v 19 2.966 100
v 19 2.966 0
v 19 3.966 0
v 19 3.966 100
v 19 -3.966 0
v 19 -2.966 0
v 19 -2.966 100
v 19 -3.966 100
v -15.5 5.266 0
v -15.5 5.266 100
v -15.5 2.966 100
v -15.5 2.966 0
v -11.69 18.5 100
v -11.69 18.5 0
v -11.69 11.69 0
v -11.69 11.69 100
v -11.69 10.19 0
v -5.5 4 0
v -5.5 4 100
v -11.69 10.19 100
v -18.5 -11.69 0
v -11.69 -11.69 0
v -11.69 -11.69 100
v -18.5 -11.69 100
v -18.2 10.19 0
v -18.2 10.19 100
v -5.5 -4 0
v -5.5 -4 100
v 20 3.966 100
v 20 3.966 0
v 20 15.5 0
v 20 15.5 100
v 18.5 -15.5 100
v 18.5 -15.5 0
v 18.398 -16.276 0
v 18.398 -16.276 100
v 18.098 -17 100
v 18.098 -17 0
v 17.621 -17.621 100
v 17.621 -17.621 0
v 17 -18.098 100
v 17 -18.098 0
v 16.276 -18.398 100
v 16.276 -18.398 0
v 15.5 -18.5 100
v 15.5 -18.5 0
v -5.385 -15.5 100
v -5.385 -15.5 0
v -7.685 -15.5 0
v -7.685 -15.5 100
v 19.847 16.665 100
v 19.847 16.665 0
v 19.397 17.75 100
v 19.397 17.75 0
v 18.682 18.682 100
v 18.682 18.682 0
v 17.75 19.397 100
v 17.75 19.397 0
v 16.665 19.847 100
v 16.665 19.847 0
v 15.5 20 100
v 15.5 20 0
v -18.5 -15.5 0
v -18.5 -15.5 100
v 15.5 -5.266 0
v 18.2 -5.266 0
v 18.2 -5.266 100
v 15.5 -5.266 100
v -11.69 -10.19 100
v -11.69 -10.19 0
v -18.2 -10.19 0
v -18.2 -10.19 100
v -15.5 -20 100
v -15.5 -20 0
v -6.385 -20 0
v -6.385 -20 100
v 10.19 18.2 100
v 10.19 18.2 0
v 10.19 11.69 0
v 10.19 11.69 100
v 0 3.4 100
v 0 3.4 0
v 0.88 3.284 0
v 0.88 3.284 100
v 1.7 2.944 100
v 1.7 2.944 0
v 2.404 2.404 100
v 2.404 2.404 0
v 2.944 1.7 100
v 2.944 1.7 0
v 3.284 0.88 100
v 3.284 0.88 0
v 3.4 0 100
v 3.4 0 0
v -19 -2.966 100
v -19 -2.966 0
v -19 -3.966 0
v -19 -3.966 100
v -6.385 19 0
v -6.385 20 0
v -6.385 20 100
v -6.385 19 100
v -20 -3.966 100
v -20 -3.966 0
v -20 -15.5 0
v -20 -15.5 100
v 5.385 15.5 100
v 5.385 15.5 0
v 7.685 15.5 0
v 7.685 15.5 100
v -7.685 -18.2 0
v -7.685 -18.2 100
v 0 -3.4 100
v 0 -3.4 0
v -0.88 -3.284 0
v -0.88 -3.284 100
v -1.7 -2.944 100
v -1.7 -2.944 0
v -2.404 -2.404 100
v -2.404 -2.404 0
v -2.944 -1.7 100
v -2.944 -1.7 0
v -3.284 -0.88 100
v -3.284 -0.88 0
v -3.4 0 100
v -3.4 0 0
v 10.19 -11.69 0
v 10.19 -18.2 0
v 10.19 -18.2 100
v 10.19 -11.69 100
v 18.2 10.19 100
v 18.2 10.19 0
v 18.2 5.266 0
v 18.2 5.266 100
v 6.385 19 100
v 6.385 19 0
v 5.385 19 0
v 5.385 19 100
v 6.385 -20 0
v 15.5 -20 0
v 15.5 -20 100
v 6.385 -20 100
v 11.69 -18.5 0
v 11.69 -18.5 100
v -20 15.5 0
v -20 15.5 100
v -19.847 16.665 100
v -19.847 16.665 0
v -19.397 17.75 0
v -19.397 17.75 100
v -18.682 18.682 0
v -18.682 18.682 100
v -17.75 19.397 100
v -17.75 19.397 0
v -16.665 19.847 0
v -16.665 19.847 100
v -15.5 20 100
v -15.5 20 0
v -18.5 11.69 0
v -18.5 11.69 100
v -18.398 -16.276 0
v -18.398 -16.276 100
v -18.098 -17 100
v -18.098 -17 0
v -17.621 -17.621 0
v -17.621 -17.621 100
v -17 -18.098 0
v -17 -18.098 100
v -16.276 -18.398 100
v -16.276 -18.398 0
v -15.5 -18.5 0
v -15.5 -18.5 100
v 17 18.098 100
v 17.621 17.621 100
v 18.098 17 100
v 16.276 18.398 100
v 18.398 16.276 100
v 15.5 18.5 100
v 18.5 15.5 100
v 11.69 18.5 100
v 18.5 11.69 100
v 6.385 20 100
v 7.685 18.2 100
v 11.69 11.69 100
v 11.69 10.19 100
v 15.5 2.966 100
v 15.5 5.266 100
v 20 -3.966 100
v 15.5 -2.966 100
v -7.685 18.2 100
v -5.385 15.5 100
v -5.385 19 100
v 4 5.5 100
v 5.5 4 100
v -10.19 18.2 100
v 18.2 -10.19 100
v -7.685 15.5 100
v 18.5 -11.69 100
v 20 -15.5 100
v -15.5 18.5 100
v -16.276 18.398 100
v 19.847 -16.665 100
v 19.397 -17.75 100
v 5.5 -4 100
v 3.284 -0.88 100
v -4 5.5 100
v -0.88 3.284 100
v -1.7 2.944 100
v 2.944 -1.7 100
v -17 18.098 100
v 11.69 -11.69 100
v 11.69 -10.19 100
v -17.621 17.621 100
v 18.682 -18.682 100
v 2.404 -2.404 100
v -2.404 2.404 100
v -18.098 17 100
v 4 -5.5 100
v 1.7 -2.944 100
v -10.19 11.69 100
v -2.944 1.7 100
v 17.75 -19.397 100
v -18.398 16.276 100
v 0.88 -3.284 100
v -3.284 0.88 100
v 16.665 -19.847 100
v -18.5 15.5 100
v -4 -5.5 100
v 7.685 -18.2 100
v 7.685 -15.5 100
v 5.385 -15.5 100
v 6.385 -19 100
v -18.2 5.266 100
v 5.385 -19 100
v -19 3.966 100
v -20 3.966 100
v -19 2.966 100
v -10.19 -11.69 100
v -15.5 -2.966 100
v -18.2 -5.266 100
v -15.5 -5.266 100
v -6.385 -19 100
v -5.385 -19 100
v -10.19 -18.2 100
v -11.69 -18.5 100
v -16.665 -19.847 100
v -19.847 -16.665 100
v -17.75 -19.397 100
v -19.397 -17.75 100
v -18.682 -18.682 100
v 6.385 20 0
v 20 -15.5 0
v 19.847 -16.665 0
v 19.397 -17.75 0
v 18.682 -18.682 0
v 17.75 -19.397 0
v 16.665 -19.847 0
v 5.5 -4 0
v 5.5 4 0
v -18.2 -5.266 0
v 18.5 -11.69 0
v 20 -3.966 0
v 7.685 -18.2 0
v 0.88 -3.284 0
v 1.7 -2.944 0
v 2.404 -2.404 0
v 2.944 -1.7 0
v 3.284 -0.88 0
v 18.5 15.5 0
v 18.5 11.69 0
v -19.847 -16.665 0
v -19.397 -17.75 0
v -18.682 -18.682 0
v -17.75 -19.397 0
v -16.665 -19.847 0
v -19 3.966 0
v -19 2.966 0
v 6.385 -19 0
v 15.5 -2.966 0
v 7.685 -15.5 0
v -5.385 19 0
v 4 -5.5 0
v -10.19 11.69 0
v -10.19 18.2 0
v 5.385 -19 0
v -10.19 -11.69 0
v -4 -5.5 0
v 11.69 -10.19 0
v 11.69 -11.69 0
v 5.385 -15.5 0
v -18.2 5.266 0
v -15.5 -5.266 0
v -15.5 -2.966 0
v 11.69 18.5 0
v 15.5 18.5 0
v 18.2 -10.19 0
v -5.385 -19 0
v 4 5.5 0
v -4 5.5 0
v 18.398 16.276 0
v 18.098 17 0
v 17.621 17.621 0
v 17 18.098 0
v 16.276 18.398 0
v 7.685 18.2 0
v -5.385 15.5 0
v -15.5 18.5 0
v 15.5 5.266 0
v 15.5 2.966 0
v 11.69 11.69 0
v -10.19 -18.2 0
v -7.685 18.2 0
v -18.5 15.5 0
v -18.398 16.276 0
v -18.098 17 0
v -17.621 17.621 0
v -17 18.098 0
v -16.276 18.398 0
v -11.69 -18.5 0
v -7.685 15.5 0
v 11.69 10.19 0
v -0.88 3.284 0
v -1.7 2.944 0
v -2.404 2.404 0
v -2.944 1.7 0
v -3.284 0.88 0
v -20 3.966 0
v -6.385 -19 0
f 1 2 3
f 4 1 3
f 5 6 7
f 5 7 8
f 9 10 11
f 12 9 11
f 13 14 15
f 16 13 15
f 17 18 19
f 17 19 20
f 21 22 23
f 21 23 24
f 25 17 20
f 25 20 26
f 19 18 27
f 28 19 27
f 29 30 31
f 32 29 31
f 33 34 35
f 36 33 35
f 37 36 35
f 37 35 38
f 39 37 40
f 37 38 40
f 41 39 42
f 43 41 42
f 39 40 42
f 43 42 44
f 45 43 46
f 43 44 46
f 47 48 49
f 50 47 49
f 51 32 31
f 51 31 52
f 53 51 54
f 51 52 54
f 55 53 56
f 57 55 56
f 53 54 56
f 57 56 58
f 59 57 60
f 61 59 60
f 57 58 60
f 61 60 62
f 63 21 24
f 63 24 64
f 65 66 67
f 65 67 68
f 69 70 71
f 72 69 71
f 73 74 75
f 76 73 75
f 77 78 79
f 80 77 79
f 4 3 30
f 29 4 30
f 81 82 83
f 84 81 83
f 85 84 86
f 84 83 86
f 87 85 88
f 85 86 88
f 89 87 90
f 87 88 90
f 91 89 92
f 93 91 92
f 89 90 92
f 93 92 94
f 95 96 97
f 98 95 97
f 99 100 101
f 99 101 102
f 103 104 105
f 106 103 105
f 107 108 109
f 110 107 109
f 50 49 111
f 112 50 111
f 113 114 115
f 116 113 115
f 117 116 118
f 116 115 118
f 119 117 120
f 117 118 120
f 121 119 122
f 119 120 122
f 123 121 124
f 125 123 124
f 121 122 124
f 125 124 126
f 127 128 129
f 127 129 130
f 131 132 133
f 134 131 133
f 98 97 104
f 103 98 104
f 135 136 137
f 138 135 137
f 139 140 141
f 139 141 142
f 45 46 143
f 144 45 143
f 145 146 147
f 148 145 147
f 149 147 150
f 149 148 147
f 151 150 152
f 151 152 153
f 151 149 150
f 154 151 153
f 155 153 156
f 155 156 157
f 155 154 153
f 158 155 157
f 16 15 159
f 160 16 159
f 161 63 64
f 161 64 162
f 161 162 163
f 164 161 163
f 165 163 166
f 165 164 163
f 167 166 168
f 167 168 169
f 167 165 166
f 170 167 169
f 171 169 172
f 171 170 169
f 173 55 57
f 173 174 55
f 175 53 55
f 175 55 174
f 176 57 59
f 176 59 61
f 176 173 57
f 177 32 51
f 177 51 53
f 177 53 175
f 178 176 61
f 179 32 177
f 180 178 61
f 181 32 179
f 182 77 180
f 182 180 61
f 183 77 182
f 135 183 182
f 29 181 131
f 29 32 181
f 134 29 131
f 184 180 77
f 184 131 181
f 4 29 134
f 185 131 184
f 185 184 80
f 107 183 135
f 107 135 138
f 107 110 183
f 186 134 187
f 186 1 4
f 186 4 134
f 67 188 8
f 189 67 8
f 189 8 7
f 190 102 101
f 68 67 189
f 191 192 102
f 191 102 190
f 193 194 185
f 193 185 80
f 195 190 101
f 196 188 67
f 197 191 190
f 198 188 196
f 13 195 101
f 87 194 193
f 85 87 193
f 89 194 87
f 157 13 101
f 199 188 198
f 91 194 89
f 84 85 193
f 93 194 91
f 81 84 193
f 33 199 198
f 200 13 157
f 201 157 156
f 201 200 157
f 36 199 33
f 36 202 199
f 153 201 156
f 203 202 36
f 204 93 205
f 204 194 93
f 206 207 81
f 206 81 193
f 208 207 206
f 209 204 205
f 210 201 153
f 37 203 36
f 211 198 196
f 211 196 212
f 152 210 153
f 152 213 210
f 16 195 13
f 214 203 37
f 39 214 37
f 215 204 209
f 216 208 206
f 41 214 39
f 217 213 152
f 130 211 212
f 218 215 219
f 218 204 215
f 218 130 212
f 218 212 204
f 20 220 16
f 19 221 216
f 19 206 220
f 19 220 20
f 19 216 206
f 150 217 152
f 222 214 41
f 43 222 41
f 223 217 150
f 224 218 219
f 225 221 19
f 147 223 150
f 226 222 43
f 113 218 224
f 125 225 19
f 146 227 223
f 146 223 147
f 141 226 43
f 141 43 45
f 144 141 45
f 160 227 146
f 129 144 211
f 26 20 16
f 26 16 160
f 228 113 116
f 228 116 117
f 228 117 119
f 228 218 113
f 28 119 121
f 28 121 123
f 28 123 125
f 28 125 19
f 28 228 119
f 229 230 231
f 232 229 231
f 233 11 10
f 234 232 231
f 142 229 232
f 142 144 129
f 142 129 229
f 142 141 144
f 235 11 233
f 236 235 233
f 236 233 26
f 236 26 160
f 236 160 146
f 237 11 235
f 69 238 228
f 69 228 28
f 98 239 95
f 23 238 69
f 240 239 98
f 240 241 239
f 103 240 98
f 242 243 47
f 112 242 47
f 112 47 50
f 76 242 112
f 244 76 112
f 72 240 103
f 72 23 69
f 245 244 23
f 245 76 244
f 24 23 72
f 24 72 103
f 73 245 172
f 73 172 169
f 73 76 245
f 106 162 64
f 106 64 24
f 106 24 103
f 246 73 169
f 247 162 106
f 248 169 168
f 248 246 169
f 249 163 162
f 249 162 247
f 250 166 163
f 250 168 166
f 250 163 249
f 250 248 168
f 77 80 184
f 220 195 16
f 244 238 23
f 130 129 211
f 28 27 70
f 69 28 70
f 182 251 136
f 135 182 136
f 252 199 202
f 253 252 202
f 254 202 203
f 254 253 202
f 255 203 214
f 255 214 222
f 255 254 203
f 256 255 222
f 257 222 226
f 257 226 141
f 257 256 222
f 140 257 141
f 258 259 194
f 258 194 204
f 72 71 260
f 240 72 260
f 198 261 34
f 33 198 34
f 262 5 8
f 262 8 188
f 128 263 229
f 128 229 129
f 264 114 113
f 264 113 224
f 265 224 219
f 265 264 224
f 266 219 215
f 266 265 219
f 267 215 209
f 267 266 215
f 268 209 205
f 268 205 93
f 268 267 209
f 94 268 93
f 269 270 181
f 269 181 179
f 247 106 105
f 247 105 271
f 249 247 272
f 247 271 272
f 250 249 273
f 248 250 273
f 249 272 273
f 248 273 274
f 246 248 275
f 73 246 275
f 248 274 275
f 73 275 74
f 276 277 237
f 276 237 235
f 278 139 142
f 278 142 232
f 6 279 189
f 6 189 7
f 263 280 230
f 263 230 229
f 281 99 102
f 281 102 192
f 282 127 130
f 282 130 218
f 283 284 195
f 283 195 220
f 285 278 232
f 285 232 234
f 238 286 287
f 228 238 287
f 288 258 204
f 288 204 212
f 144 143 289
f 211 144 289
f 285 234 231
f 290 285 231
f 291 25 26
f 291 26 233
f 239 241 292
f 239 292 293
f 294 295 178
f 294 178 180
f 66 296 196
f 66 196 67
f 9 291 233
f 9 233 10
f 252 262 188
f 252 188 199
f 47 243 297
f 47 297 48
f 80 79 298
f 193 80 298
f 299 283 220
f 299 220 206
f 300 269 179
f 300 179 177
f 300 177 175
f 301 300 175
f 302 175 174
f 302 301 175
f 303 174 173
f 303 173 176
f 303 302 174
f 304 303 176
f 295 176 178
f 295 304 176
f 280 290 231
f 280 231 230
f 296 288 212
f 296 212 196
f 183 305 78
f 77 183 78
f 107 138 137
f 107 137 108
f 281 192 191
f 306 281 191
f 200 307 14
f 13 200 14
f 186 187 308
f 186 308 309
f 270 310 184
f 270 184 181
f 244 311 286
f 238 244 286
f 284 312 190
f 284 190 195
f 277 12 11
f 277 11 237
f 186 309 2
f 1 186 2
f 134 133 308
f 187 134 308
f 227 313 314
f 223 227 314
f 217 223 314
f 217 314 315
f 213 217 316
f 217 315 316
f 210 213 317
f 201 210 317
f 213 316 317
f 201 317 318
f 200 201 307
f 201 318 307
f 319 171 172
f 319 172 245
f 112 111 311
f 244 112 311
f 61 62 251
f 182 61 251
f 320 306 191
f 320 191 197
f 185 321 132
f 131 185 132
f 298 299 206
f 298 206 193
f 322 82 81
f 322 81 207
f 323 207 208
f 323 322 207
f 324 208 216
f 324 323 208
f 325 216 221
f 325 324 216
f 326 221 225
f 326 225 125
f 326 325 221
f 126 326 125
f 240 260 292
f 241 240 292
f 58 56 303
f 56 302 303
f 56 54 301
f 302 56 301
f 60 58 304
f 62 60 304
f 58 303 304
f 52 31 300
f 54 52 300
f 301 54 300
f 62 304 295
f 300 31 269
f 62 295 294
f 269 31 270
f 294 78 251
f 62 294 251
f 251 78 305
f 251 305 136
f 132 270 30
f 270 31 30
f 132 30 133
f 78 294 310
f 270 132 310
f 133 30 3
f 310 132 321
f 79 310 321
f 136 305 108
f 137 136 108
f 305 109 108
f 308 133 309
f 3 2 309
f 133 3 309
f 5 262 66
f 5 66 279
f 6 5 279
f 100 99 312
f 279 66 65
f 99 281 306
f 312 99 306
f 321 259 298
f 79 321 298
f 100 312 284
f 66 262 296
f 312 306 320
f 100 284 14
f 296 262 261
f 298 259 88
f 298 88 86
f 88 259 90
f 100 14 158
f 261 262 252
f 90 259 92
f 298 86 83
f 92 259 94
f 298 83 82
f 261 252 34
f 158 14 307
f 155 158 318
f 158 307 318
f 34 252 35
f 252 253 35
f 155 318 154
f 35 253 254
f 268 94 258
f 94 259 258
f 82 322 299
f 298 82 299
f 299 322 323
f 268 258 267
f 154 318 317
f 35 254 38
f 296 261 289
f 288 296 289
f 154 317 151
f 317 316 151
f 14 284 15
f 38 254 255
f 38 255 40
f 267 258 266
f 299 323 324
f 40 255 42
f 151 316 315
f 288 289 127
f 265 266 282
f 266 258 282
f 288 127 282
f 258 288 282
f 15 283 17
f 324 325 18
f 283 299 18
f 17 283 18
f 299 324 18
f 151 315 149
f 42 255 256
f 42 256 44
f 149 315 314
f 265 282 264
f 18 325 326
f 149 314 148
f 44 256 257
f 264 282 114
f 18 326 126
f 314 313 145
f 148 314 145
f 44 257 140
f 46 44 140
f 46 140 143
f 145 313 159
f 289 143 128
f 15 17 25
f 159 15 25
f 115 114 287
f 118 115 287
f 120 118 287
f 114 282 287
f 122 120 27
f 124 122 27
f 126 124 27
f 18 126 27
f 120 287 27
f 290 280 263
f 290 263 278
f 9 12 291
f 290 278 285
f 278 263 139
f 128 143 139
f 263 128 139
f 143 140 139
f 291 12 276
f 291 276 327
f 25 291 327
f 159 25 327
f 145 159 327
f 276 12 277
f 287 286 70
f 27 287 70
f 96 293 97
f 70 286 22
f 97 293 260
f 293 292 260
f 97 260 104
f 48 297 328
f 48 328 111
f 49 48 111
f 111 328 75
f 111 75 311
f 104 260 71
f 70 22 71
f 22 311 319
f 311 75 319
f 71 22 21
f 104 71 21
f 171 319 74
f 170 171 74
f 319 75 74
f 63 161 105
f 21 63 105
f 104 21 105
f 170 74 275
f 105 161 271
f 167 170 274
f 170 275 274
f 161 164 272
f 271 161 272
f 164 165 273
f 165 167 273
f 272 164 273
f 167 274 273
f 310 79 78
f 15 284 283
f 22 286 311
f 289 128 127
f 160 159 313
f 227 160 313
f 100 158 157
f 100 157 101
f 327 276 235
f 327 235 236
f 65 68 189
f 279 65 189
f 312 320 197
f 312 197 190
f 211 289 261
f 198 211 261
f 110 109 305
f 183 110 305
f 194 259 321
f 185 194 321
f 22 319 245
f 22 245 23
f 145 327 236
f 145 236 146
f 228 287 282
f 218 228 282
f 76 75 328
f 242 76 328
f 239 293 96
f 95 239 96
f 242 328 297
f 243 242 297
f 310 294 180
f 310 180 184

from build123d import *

# Parameters (mm, degrees)
BOSS_EXTRUDE1_DEPTH  = 100
MIRROR3_COPY_1_DEPTH = 100
MIRROR3_COPY_2_DEPTH = 100


with BuildPart() as part:
    # Sketch1 → Boss-Extrude1 (new body)
    with BuildSketch(Plane.XY):
        with BuildLine():
            Line((3.4, 0), (5.5, 0))
            Line((5.5, 0), (5.5, 4))
            Line((5.5, 4), (11.69, 10.19))
            Line((11.69, 10.19), (18.2, 10.19))
            Line((18.2, 10.19), (18.2, 5.265595036))
            Line((18.2, 5.265595036), (15.5, 5.265595036))
            Line((15.5, 5.265595036), (15.5, 2.965595036))
            Line((15.5, 2.965595036), (19, 2.965595036))
            Line((19, 2.965595036), (19, 3.965595036))
            Line((19, 3.965595036), (20, 3.965595036))
            Line((20, 3.965595036), (20, 15.5))
            ThreePointArc((20, 15.5), (18.681980515, 18.681980515), (15.5, 20))
            Line((15.5, 20), (6.385304712, 20))
            Line((6.385304712, 20), (6.385304712, 19))
            Line((6.385304712, 19), (5.385304712, 19))
            Line((5.385304712, 19), (5.385304712, 15.5))
            Line((5.385304712, 15.5), (7.685304712, 15.5))
            Line((7.685304712, 15.5), (7.685304712, 18.2))
            Line((7.685304712, 18.2), (10.19, 18.2))
            Line((10.19, 18.2), (10.19, 11.69))
            Line((10.19, 11.69), (4, 5.5))
            Line((4, 5.5), (0, 5.5))
            Line((0, 5.5), (0, 3.4))
            ThreePointArc((0, 3.4), (2.404163056, 2.404163056), (3.4, 0))
        make_face()
        with BuildLine():
            Line((18.5, 11.69), (18.5, 15.5))
            ThreePointArc((18.5, 15.5), (17.621320344, 17.621320344), (15.5, 18.5))
            Line((15.5, 18.5), (11.69, 18.5))
            Line((11.69, 18.5), (11.69, 11.69))
            Line((11.69, 11.69), (18.5, 11.69))
        make_face(mode=Mode.SUBTRACT)
    boss_extrude1 = extrude(amount=BOSS_EXTRUDE1_DEPTH)

    # Mirror1: Boss-Extrude1 across plane
    add(boss_extrude1.mirror(Plane.ZX))

    # Mirror2: Boss-Extrude1 across plane
    add(boss_extrude1.mirror(Plane(origin=(0, 0, 0), x_dir=(0, 0, 1), z_dir=(1, 0, 0))))

    # Mirror3 copy 1 sketch → Mirror3 copy 1 (add)
    with BuildSketch(Plane(origin=(0, 0, 0), x_dir=(-1, 0, 0), z_dir=(0, 0, 1))):
        with BuildLine():
            Line((3.4, 0), (5.5, 0))
            Line((5.5, 0), (5.5, 4))
            Line((5.5, 4), (11.69, 10.19))
            Line((11.69, 10.19), (18.2, 10.19))
            Line((18.2, 10.19), (18.2, 5.265595036))
            Line((18.2, 5.265595036), (15.5, 5.265595036))
            Line((15.5, 5.265595036), (15.5, 2.965595036))
            Line((15.5, 2.965595036), (19, 2.965595036))
            Line((19, 2.965595036), (19, 3.965595036))
            Line((19, 3.965595036), (20, 3.965595036))
            Line((20, 3.965595036), (20, 15.5))
            ThreePointArc((20, 15.5), (18.681980515, 18.681980515), (15.5, 20))
            Line((15.5, 20), (6.385304712, 20))
            Line((6.385304712, 20), (6.385304712, 19))
            Line((6.385304712, 19), (5.385304712, 19))
            Line((5.385304712, 19), (5.385304712, 15.5))
            Line((5.385304712, 15.5), (7.685304712, 15.5))
            Line((7.685304712, 15.5), (7.685304712, 18.2))
            Line((7.685304712, 18.2), (10.19, 18.2))
            Line((10.19, 18.2), (10.19, 11.69))
            Line((10.19, 11.69), (4, 5.5))
            Line((4, 5.5), (0, 5.5))
            Line((0, 5.5), (0, 3.4))
            ThreePointArc((0, 3.4), (2.404163056, 2.404163056), (3.4, 0))
        make_face()
        with BuildLine():
            Line((18.5, 11.69), (18.5, 15.5))
            ThreePointArc((18.5, 15.5), (17.621320344, 17.621320344), (15.5, 18.5))
            Line((15.5, 18.5), (11.69, 18.5))
            Line((11.69, 18.5), (11.69, 11.69))
            Line((11.69, 11.69), (18.5, 11.69))
        make_face(mode=Mode.SUBTRACT)
    extrude(amount=MIRROR3_COPY_1_DEPTH)

    # Mirror3 copy 2 sketch → Mirror3 copy 2 (add)
    with BuildSketch(Plane.XY):
        with BuildLine():
            Line((3.4, 0), (5.5, 0))
            Line((5.5, 0), (5.5, -4))
            Line((5.5, -4), (11.69, -10.19))
            Line((11.69, -10.19), (18.2, -10.19))
            Line((18.2, -10.19), (18.2, -5.265595036))
            Line((18.2, -5.265595036), (15.5, -5.265595036))
            Line((15.5, -5.265595036), (15.5, -2.965595036))
            Line((15.5, -2.965595036), (19, -2.965595036))
            Line((19, -2.965595036), (19, -3.965595036))
            Line((19, -3.965595036), (20, -3.965595036))
            Line((20, -3.965595036), (20, -15.5))
            ThreePointArc((20, -15.5), (18.681980515, -18.681980515), (15.5, -20))
            Line((15.5, -20), (6.385304712, -20))
            Line((6.385304712, -20), (6.385304712, -19))
            Line((6.385304712, -19), (5.385304712, -19))
            Line((5.385304712, -19), (5.385304712, -15.5))
            Line((5.385304712, -15.5), (7.685304712, -15.5))
            Line((7.685304712, -15.5), (7.685304712, -18.2))
            Line((7.685304712, -18.2), (10.19, -18.2))
            Line((10.19, -18.2), (10.19, -11.69))
            Line((10.19, -11.69), (4, -5.5))
            Line((4, -5.5), (0, -5.5))
            Line((0, -5.5), (0, -3.4))
            ThreePointArc((0, -3.4), (2.404163056, -2.404163056), (3.4, 0))
        make_face()
        with BuildLine():
            Line((18.5, -11.69), (18.5, -15.5))
            ThreePointArc((18.5, -15.5), (17.621320344, -17.621320344), (15.5, -18.5))
            Line((15.5, -18.5), (11.69, -18.5))
            Line((11.69, -18.5), (11.69, -11.69))
            Line((11.69, -11.69), (18.5, -11.69))
        make_face(mode=Mode.SUBTRACT)
    extrude(amount=MIRROR3_COPY_2_DEPTH)


solid = part.part
